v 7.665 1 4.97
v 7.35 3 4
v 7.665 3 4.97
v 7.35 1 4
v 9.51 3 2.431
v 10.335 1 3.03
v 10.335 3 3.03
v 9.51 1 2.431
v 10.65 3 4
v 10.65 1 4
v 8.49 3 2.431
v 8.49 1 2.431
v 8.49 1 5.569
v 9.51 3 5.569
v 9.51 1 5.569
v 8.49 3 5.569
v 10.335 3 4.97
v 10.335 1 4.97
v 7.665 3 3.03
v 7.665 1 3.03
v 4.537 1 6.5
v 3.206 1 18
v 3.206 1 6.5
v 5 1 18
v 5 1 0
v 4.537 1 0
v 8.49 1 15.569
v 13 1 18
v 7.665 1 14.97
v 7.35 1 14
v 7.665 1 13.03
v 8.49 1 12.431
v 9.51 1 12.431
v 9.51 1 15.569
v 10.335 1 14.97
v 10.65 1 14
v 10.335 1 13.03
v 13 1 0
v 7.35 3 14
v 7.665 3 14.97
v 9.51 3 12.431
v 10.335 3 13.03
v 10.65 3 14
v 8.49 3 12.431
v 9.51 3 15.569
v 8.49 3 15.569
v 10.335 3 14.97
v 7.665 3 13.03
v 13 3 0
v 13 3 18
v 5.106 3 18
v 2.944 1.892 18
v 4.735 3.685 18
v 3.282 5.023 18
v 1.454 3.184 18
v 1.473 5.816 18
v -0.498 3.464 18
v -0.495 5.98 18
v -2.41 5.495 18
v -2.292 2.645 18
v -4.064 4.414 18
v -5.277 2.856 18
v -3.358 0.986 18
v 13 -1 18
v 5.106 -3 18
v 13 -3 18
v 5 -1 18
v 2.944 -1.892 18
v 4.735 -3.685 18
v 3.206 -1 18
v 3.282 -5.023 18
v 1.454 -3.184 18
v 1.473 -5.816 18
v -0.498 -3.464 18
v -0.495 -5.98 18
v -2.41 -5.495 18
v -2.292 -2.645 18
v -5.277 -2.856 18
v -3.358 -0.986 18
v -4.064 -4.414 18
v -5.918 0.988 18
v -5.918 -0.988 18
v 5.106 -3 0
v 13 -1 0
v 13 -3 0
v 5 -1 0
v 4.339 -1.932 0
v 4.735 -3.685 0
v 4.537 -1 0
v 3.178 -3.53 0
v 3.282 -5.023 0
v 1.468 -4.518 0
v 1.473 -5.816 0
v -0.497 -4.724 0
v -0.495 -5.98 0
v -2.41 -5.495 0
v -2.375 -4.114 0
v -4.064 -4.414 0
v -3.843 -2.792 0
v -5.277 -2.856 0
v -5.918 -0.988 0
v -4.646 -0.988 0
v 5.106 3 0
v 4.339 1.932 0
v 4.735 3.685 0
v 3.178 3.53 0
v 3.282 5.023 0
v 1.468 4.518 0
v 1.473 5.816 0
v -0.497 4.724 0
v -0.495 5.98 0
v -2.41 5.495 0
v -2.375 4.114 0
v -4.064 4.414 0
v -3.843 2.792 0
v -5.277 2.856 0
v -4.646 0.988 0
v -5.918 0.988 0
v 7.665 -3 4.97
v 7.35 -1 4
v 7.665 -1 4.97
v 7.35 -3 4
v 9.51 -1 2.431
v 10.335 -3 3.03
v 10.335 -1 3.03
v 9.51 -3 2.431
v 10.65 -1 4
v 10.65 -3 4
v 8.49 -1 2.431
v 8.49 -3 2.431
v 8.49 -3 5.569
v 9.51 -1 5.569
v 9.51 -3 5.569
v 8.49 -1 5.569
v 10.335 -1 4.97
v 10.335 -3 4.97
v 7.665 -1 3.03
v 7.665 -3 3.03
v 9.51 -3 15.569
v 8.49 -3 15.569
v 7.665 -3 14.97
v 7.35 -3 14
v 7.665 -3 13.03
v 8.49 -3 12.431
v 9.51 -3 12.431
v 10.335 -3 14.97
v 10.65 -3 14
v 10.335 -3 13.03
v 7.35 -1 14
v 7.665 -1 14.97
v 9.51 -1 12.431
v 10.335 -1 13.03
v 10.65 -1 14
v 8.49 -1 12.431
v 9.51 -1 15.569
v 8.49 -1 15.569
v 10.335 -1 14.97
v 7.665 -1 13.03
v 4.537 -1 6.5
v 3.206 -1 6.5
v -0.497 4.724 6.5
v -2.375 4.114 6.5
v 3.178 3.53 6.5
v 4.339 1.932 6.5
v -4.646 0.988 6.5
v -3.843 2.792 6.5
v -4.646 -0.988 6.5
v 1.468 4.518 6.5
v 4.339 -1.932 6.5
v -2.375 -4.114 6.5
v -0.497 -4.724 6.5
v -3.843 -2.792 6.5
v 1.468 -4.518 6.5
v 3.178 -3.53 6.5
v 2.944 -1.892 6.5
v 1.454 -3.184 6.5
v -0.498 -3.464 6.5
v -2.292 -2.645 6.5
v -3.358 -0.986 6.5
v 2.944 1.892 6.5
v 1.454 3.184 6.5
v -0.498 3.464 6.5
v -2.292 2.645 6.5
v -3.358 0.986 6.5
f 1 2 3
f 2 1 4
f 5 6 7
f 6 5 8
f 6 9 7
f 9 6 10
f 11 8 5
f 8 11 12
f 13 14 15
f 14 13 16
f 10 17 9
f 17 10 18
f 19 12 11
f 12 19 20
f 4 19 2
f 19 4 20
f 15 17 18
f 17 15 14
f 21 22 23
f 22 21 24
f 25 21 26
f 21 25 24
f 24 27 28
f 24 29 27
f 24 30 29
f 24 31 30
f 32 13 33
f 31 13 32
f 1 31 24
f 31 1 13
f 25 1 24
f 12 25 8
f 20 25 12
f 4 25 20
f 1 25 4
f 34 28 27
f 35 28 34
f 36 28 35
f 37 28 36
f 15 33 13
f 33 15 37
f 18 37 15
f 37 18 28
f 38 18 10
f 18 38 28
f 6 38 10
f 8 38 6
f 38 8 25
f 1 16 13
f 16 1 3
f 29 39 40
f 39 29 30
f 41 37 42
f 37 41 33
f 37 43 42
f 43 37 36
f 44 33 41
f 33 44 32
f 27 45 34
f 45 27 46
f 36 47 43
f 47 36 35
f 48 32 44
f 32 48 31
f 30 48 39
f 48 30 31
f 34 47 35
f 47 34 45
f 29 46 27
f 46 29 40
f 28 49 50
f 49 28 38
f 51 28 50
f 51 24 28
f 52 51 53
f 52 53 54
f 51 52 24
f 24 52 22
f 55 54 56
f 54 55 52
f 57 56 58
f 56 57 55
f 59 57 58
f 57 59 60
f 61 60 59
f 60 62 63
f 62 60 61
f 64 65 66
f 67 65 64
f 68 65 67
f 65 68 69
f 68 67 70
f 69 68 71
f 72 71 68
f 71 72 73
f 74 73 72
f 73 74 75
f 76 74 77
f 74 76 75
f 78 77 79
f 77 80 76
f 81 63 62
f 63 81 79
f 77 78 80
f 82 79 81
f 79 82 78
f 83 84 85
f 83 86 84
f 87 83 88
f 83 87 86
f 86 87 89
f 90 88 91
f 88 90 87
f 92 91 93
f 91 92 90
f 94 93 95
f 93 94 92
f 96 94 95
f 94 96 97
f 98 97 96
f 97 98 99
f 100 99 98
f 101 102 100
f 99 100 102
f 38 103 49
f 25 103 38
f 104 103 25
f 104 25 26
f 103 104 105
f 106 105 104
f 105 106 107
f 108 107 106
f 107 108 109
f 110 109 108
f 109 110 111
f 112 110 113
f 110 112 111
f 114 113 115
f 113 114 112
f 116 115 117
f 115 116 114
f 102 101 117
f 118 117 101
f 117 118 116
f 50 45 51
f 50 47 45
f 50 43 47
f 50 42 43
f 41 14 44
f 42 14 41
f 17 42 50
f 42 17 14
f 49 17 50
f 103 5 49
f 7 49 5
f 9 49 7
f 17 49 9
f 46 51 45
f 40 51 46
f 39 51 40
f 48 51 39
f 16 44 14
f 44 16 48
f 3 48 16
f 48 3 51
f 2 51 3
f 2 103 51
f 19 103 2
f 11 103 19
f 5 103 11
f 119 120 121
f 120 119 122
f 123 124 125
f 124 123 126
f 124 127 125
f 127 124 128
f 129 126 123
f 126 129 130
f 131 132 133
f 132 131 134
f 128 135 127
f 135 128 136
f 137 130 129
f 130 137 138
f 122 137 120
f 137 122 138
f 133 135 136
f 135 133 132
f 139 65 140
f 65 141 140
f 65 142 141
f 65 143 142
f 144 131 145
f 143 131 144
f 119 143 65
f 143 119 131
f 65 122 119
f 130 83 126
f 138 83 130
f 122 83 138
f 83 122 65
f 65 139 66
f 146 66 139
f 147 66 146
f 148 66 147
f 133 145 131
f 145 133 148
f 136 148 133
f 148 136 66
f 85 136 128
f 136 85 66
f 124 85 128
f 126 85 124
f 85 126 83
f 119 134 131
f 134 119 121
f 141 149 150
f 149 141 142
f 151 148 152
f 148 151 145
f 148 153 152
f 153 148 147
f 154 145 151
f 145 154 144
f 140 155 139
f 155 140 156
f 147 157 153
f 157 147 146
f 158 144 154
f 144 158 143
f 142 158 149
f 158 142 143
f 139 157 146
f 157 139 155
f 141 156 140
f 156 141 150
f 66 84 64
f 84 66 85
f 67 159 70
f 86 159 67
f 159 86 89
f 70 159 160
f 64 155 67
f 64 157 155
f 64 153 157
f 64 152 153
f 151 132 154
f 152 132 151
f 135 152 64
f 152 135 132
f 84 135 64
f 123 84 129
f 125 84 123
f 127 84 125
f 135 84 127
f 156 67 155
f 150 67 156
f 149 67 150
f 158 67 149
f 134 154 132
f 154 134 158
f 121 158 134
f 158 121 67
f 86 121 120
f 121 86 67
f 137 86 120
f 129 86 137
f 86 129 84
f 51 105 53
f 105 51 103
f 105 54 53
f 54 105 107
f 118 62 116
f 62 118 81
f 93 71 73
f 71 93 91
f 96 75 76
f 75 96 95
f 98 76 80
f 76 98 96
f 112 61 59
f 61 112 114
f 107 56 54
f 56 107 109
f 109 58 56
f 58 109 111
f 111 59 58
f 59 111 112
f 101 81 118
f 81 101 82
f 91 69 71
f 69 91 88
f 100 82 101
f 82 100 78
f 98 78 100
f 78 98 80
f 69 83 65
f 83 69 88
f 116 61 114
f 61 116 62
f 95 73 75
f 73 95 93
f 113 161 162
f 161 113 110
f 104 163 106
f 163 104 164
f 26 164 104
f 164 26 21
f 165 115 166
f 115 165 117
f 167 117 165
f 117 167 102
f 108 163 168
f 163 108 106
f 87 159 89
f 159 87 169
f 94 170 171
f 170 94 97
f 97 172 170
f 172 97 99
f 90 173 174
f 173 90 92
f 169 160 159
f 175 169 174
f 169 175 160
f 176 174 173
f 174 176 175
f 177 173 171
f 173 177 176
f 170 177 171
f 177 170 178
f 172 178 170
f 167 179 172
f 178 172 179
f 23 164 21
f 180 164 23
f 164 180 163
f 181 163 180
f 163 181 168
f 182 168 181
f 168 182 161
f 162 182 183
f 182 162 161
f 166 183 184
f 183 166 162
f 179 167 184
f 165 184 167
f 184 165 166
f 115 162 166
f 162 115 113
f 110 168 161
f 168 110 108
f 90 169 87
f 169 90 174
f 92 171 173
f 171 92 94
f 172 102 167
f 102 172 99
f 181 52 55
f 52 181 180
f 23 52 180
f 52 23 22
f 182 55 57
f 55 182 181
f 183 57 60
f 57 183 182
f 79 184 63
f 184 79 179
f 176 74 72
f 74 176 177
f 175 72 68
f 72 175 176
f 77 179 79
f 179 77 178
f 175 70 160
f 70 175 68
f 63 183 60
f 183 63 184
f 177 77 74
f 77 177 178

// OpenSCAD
module flange() {
    difference() {
        cylinder(d = 12, h=18);
        cylinder(d = 9.5, h = 6.5);
        translate([0,0,6.5])
        cylinder(d = 7, h = 20);
    }
}

module holed_ear(holes=1) {
    translate([-4,-1,0])
    difference() {
        cube([8,2,18]);
        if (holes == 1) {
            translate([4,0,4])
            rotate([-90,0,0])
            cylinder(d = 3.3, h = 10, $fn = 10);
            translate([4,0,18-4])
            rotate([-90,0,0])
            cylinder(d = 3.3, h = 10, $fn = 10);
        }
    }
    
}
translate([9,2,0])
holed_ear();
translate([9,-2,0])
holed_ear();
difference() {
    flange();
    translate([3,0,0])
    holed_ear(0);
}
